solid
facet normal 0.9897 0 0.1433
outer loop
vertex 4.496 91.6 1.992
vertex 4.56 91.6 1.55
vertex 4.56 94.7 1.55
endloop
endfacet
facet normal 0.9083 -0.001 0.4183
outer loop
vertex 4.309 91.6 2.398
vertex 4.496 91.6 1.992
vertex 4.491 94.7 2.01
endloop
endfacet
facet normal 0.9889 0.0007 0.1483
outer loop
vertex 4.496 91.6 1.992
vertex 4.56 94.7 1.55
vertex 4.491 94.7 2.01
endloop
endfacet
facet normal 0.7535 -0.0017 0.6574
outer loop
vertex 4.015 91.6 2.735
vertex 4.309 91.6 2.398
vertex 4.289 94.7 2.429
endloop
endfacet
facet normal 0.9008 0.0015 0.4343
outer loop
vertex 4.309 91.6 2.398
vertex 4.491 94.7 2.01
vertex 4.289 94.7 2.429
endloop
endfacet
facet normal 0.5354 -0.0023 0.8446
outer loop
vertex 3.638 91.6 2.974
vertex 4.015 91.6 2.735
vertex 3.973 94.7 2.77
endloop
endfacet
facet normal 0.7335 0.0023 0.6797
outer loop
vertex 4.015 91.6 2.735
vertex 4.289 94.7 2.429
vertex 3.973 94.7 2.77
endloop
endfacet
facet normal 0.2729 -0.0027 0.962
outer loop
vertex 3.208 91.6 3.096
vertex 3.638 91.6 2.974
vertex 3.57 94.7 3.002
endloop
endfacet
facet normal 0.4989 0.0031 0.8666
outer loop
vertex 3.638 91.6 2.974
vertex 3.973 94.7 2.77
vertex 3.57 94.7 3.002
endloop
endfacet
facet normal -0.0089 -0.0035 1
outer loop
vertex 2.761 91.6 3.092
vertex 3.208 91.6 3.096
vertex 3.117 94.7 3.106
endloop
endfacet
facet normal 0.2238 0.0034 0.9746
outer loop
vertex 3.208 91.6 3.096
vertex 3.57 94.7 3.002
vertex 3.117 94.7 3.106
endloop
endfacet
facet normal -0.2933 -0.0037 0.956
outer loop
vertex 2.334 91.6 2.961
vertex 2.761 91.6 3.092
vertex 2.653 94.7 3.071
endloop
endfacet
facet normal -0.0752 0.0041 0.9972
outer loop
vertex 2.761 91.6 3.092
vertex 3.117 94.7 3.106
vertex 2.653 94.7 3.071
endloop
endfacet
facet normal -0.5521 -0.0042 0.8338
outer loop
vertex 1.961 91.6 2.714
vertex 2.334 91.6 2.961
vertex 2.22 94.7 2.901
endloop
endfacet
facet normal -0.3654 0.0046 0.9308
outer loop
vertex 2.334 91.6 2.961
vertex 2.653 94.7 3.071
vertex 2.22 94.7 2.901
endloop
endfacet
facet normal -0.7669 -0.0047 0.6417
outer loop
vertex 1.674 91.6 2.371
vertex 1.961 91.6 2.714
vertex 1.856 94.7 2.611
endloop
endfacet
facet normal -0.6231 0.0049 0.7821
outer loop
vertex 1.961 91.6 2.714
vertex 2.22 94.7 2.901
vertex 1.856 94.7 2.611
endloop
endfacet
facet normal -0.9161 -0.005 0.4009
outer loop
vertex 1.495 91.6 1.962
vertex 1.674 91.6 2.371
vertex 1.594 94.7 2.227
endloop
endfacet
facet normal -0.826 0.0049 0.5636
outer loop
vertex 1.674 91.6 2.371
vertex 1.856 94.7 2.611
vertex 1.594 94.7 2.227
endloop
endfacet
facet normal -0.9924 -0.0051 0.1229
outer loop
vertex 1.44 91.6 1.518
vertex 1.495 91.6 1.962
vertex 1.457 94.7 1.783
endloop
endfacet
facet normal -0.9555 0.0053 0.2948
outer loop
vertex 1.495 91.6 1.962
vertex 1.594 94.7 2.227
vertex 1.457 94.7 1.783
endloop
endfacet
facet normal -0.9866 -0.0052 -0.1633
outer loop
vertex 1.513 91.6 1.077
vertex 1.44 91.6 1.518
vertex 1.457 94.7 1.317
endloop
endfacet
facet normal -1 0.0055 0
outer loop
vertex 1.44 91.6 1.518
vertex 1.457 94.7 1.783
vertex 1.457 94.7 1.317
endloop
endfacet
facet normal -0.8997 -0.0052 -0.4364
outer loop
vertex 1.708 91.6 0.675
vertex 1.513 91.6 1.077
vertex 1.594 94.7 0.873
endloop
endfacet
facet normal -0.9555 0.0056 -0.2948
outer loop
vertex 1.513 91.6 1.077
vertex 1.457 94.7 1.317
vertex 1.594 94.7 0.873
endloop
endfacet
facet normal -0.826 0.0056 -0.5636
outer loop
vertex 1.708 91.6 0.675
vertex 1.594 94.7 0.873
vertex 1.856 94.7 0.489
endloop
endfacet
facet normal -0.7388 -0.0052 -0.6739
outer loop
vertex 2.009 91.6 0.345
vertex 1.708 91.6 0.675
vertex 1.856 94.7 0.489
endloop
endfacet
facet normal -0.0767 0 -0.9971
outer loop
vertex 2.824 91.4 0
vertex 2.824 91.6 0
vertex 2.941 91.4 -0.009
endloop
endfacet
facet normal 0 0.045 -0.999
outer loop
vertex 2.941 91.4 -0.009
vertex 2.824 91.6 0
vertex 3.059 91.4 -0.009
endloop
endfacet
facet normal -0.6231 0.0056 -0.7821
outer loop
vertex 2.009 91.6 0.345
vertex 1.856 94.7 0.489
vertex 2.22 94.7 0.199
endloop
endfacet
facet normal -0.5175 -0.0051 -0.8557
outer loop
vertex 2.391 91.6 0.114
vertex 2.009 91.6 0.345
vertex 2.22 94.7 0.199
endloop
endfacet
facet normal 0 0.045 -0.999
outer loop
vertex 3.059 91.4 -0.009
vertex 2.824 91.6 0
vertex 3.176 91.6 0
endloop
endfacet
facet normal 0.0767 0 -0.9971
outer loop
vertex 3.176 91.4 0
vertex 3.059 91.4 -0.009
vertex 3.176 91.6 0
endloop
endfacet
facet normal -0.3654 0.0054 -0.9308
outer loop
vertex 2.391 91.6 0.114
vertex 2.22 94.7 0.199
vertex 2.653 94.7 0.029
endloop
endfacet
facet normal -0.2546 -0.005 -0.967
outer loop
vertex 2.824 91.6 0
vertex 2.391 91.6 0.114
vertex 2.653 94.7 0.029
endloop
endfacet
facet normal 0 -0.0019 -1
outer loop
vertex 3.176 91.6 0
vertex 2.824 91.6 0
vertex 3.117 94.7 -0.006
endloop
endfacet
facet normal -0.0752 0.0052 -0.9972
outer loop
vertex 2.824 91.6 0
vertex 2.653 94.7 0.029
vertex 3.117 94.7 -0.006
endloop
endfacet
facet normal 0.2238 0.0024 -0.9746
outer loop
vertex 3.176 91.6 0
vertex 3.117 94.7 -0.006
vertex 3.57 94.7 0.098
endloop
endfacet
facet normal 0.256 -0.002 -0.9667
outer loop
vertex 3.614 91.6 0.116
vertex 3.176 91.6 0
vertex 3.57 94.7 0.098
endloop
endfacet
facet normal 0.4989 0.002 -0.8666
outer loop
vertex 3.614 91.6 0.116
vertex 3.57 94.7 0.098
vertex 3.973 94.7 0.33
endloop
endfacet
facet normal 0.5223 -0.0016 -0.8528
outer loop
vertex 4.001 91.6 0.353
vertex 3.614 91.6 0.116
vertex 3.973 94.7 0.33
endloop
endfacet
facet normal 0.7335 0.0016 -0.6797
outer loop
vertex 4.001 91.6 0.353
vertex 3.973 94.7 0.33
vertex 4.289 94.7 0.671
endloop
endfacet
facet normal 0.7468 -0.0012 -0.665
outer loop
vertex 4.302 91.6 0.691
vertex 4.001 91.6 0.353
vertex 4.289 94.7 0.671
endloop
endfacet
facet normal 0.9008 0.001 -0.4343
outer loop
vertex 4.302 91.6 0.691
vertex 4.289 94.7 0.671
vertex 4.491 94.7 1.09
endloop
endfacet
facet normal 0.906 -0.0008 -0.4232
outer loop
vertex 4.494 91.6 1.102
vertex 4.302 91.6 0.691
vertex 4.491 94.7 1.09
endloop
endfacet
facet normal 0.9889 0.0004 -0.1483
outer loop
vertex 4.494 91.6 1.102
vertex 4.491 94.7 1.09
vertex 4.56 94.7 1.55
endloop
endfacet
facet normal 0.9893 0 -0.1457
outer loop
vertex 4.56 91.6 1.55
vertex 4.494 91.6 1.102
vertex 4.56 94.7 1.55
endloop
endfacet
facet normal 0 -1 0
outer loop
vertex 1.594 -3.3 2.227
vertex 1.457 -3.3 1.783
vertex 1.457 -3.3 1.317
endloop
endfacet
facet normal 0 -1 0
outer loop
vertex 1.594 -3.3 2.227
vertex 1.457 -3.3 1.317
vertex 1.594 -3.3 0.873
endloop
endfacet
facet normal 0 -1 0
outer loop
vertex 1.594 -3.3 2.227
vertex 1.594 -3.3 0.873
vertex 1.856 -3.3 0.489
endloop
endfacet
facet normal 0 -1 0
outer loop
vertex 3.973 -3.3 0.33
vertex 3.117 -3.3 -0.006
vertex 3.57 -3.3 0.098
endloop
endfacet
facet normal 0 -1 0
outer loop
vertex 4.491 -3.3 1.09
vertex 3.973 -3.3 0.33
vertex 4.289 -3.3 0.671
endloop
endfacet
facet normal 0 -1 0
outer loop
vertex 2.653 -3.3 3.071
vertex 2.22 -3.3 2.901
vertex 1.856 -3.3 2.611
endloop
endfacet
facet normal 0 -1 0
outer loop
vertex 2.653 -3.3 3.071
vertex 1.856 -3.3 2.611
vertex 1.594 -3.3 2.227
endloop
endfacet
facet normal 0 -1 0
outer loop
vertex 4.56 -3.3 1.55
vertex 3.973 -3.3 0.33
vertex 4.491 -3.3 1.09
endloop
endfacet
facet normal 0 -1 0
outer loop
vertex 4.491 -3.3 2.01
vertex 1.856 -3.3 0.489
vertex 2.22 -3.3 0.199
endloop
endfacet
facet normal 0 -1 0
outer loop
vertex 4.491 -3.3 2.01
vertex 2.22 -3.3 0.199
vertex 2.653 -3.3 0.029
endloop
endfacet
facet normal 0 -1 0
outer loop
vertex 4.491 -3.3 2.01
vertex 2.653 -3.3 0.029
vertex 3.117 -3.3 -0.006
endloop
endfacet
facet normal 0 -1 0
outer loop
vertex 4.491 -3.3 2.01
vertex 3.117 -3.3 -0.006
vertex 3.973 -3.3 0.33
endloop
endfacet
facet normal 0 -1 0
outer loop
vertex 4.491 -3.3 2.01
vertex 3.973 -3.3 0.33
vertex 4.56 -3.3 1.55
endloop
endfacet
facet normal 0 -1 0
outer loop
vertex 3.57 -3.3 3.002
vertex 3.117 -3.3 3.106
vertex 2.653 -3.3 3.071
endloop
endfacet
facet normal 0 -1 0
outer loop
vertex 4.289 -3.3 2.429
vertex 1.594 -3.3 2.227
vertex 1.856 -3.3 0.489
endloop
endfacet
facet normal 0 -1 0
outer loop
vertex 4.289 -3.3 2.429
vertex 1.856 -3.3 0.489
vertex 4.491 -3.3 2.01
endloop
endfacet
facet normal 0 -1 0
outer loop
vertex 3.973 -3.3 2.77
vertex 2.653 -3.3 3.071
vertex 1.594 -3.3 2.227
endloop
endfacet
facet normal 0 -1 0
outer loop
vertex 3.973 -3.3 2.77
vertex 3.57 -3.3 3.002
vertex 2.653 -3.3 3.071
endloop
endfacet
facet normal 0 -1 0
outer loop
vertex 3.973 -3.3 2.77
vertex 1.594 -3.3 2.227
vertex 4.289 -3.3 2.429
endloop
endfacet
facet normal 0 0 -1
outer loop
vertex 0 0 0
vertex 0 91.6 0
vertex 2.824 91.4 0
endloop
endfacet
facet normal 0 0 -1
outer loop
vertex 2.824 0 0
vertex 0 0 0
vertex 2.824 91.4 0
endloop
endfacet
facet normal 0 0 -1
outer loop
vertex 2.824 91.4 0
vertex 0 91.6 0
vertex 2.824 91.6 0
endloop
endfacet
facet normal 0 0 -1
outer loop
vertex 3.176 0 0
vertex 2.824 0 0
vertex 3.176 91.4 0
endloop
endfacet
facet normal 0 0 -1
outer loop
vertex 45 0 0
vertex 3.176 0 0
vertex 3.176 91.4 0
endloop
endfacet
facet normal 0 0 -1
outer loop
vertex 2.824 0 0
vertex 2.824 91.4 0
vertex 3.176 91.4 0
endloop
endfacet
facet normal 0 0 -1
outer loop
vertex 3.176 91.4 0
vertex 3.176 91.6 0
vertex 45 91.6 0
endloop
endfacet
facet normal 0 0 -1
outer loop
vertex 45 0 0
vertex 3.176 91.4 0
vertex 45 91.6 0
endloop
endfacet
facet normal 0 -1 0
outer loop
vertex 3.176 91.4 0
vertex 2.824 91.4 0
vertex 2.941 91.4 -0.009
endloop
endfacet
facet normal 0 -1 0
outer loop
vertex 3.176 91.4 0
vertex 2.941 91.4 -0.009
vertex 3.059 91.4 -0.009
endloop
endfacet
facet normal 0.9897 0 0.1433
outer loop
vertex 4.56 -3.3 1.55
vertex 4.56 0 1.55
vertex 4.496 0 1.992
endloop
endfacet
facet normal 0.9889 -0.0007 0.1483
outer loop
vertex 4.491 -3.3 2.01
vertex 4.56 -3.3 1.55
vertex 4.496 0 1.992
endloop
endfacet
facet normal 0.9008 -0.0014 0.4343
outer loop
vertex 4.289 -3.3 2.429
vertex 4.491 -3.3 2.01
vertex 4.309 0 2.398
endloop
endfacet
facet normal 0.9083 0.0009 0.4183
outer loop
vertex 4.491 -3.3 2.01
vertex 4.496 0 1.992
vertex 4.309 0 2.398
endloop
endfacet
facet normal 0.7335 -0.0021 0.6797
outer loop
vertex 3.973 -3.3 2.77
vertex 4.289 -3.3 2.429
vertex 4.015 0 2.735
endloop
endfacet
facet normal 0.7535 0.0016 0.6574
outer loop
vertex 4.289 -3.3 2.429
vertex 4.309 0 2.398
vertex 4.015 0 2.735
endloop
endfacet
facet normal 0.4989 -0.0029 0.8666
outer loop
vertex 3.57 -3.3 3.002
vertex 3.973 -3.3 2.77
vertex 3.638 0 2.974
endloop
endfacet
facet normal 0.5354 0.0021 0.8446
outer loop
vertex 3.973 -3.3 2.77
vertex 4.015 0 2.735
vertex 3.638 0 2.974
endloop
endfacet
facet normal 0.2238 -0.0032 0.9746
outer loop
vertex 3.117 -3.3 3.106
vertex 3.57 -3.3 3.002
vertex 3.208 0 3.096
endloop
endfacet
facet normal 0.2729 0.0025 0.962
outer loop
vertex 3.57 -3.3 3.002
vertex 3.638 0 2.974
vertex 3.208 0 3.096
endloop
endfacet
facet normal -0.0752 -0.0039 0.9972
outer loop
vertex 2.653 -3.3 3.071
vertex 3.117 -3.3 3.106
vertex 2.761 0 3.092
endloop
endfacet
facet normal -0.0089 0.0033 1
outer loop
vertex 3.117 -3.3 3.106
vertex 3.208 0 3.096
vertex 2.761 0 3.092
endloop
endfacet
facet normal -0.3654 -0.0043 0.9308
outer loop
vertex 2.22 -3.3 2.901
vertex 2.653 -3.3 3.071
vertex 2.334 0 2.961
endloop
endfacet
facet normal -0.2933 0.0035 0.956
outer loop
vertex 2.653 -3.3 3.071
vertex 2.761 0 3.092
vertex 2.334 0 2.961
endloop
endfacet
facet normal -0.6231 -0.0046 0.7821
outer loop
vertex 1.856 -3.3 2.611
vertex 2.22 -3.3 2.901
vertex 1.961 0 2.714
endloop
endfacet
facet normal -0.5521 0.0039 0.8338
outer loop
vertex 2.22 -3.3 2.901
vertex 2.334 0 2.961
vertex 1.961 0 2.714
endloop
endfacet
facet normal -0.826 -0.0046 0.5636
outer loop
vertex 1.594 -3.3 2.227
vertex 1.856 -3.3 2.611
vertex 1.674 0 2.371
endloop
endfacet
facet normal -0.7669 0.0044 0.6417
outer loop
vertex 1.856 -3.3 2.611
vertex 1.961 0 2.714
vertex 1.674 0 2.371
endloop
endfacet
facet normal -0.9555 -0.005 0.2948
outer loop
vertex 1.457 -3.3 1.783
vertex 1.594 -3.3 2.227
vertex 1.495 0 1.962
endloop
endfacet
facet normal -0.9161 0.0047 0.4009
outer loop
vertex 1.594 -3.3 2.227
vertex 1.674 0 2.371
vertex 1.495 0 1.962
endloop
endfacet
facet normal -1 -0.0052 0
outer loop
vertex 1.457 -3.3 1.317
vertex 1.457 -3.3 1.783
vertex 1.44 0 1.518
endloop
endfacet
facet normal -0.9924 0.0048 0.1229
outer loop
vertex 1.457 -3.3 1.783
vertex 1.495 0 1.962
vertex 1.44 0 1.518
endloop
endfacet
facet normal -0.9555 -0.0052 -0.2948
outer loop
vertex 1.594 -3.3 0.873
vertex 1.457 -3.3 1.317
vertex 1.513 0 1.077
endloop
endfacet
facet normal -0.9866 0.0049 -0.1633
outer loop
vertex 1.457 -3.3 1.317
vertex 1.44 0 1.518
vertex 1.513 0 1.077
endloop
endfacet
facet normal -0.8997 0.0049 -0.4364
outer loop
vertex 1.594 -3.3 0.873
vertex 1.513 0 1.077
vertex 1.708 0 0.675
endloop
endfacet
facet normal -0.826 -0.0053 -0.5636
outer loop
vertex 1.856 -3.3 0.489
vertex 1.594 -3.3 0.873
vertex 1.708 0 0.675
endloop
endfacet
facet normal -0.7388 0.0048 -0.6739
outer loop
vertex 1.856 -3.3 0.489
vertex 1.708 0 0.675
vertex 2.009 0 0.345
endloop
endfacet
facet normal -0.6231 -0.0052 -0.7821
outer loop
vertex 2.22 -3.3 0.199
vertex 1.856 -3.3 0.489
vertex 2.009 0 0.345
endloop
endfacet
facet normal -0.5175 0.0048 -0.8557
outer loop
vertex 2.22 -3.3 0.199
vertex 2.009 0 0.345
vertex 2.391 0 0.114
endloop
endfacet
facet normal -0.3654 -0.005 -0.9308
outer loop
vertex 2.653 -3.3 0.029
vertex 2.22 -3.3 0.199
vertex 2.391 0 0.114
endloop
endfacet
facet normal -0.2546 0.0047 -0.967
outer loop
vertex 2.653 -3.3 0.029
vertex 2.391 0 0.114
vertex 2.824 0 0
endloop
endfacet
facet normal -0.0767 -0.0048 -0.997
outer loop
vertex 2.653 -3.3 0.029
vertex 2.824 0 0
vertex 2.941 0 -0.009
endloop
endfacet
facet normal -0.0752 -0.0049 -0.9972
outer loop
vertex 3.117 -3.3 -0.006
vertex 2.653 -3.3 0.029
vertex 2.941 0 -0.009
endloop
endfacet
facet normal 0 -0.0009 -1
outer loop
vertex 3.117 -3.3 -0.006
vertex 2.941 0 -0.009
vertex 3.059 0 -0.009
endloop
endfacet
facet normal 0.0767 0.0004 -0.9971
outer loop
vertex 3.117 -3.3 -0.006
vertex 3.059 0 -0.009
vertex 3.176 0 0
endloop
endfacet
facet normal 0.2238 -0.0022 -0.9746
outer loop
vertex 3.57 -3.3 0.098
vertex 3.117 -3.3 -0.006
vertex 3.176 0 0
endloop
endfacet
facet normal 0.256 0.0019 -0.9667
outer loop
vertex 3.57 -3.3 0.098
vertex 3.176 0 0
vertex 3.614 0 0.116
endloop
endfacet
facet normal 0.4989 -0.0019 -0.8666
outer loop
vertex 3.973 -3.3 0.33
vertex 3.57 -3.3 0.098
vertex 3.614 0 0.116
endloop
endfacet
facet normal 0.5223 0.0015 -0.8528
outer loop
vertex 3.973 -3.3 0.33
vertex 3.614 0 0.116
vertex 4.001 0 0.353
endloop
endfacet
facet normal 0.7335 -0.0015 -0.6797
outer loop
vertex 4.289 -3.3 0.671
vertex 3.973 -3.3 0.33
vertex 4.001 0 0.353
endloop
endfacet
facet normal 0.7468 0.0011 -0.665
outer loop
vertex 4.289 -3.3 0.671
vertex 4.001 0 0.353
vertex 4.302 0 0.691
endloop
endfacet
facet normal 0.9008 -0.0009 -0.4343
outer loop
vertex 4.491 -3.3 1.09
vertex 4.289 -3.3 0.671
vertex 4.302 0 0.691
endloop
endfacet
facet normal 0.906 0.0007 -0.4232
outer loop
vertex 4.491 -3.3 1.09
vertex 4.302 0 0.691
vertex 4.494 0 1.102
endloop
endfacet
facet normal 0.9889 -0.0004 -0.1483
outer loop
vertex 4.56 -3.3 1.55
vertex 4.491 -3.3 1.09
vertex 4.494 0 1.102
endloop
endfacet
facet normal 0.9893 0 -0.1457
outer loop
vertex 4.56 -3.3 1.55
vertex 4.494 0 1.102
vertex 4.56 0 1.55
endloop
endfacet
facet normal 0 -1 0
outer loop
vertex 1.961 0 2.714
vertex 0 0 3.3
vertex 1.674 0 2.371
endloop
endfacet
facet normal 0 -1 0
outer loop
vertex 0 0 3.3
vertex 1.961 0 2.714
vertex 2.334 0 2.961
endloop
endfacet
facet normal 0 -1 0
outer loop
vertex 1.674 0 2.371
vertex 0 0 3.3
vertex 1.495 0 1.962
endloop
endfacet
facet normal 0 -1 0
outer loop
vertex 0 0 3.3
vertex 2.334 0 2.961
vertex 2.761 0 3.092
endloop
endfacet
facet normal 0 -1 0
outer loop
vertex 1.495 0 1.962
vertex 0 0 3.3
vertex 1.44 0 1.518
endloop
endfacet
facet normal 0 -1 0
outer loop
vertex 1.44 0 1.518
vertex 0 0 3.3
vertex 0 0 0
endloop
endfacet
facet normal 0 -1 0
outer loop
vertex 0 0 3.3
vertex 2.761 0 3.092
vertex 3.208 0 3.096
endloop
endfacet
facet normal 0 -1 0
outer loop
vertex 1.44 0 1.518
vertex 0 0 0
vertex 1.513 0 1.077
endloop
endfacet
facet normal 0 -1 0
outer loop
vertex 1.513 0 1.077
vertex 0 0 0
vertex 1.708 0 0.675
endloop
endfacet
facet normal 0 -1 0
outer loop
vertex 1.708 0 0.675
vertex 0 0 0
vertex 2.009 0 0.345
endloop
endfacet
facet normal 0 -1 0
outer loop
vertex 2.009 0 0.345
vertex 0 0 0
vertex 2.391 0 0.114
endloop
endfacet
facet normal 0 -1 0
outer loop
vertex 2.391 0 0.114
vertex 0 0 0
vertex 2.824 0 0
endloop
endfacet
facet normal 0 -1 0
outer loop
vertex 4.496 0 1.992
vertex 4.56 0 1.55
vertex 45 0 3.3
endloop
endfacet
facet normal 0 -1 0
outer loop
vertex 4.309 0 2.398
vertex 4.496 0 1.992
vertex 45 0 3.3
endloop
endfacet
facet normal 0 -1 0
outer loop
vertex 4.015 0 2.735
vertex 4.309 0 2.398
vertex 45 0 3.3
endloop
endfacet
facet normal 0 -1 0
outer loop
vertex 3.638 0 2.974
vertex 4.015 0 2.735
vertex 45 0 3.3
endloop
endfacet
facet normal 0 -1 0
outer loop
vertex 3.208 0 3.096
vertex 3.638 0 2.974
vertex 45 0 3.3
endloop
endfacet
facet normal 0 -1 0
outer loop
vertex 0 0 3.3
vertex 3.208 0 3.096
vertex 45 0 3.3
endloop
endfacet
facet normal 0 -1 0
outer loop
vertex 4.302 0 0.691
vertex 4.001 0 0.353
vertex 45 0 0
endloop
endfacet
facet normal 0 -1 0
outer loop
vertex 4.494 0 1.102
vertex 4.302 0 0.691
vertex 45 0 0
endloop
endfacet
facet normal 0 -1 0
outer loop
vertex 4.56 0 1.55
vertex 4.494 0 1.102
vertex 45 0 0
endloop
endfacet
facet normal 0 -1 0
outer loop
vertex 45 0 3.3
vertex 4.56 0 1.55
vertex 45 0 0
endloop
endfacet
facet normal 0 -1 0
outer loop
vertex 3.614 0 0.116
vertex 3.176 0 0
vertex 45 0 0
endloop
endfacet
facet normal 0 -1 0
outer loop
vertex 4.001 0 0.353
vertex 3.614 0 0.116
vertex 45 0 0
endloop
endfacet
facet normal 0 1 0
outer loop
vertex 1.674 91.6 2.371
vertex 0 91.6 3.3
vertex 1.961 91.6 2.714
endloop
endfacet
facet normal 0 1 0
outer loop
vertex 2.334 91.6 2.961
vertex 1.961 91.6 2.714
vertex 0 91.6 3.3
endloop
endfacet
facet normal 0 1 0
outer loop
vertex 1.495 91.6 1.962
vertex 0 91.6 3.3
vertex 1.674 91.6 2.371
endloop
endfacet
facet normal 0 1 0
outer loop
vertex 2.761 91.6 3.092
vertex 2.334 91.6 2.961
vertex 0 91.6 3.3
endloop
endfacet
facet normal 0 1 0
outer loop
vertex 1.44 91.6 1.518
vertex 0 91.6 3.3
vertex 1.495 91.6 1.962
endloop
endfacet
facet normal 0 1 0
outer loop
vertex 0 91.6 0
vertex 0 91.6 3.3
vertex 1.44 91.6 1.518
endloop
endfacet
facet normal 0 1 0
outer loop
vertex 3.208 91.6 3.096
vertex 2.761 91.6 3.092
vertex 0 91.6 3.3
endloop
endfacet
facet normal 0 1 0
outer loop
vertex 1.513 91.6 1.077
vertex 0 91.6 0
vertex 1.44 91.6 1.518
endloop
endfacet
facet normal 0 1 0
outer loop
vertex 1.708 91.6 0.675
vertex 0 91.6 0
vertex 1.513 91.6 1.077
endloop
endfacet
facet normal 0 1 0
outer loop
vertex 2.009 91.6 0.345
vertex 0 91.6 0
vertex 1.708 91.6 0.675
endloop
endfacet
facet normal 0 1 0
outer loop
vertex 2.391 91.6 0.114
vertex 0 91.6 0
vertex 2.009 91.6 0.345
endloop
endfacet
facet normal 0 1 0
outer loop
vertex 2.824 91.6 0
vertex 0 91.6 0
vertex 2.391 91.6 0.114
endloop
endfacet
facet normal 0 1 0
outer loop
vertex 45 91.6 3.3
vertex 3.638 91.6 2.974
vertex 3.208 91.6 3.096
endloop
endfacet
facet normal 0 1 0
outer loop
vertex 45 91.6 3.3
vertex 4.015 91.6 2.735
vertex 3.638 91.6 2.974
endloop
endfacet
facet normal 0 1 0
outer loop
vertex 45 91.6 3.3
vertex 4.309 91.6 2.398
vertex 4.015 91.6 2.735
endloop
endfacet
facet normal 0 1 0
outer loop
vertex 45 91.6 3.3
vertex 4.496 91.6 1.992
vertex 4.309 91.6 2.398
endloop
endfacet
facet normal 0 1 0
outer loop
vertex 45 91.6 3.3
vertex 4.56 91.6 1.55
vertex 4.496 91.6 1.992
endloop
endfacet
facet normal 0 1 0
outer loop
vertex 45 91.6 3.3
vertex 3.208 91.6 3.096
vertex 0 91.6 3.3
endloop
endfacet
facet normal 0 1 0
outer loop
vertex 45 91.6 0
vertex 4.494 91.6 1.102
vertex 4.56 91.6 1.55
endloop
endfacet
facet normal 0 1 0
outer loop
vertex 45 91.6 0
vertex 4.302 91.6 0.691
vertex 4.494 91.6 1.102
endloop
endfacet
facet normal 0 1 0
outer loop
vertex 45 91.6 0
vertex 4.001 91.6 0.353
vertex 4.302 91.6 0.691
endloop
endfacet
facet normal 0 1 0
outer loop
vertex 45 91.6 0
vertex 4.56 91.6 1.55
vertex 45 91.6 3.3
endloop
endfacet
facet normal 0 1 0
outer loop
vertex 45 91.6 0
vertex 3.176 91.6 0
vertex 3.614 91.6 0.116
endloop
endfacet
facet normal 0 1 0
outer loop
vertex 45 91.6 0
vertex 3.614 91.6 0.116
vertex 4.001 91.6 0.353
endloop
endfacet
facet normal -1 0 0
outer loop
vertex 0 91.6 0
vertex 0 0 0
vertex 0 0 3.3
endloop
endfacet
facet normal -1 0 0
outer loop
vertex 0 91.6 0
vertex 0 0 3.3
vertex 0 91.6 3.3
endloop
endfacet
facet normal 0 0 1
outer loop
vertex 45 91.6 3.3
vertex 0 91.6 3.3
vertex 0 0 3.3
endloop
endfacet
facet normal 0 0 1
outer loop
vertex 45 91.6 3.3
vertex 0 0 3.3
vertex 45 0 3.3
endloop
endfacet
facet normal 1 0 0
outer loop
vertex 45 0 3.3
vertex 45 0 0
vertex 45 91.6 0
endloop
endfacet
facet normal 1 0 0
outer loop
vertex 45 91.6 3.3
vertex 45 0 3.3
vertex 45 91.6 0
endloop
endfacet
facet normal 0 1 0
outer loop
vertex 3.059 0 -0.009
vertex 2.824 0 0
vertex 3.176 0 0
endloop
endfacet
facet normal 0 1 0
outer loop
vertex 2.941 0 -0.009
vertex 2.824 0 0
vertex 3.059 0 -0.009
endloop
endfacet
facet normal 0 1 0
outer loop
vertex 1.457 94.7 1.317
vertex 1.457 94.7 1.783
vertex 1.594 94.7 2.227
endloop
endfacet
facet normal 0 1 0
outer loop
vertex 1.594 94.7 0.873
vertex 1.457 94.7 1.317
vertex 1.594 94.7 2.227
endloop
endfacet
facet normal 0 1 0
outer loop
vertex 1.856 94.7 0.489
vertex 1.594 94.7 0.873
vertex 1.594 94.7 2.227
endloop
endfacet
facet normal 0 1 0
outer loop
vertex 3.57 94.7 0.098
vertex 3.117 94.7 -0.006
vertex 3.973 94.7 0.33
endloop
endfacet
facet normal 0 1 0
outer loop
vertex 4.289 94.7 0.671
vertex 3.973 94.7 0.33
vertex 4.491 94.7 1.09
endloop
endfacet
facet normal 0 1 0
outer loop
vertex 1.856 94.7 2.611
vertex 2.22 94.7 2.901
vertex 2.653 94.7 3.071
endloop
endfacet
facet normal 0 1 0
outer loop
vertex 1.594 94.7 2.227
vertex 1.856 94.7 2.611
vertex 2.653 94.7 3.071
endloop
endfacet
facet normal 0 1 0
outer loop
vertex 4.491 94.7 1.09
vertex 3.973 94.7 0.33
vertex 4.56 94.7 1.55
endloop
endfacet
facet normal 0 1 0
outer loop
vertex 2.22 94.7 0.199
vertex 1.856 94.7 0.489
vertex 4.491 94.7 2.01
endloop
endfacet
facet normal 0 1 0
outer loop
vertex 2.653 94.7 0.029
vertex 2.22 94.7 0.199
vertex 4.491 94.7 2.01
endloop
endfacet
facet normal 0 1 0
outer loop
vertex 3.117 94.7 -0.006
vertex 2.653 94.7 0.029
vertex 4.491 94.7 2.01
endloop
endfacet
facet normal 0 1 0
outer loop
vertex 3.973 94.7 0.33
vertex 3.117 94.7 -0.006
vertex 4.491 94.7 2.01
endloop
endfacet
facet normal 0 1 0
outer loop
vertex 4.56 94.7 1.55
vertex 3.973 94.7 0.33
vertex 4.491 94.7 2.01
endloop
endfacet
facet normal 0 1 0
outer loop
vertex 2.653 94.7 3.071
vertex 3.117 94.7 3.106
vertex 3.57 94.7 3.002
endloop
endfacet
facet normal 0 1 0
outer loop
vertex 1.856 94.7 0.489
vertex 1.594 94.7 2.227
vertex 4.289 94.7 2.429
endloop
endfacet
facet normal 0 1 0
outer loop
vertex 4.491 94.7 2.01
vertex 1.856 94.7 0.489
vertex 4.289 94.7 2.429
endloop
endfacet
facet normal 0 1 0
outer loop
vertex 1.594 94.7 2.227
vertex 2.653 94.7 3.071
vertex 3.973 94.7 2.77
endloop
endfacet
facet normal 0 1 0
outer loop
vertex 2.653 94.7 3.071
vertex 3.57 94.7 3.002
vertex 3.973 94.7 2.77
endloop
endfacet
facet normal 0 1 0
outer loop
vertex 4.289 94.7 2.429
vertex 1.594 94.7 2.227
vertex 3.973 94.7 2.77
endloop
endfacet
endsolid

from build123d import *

# Parameters (mm, degrees)
BOX_W             = 45
BOX_H             = 91.6
BOX_DEPTH         = 3.3
CYLINDER_R        = 1.56
CYLINDER_DEPTH    = 3.3
CYLINDER001_R     = 1.56
CYLINDER001_DEPTH = 3.3


with BuildPart() as part:
    # Box → Box (join)
    with BuildSketch(Plane.XY):
        with Locations((22.5, 45.8)):
            Rectangle(BOX_W, BOX_H)
    extrude(amount=BOX_DEPTH)

    # Cylinder → Cylinder (join)
    with BuildSketch(Plane(origin=(3, 0, 1.55), x_dir=(1, 0, 0), z_dir=(0, -1, 0))):
        Circle(CYLINDER_R)
    extrude(amount=CYLINDER_DEPTH)

    # Cylinder001 → Cylinder001 (join)
    with BuildSketch(Plane(origin=(3, 94.7, 1.55), x_dir=(1, 0, 0), z_dir=(0, -1, 0))):
        Circle(CYLINDER001_R)
    extrude(amount=CYLINDER001_DEPTH)


solid = part.part
